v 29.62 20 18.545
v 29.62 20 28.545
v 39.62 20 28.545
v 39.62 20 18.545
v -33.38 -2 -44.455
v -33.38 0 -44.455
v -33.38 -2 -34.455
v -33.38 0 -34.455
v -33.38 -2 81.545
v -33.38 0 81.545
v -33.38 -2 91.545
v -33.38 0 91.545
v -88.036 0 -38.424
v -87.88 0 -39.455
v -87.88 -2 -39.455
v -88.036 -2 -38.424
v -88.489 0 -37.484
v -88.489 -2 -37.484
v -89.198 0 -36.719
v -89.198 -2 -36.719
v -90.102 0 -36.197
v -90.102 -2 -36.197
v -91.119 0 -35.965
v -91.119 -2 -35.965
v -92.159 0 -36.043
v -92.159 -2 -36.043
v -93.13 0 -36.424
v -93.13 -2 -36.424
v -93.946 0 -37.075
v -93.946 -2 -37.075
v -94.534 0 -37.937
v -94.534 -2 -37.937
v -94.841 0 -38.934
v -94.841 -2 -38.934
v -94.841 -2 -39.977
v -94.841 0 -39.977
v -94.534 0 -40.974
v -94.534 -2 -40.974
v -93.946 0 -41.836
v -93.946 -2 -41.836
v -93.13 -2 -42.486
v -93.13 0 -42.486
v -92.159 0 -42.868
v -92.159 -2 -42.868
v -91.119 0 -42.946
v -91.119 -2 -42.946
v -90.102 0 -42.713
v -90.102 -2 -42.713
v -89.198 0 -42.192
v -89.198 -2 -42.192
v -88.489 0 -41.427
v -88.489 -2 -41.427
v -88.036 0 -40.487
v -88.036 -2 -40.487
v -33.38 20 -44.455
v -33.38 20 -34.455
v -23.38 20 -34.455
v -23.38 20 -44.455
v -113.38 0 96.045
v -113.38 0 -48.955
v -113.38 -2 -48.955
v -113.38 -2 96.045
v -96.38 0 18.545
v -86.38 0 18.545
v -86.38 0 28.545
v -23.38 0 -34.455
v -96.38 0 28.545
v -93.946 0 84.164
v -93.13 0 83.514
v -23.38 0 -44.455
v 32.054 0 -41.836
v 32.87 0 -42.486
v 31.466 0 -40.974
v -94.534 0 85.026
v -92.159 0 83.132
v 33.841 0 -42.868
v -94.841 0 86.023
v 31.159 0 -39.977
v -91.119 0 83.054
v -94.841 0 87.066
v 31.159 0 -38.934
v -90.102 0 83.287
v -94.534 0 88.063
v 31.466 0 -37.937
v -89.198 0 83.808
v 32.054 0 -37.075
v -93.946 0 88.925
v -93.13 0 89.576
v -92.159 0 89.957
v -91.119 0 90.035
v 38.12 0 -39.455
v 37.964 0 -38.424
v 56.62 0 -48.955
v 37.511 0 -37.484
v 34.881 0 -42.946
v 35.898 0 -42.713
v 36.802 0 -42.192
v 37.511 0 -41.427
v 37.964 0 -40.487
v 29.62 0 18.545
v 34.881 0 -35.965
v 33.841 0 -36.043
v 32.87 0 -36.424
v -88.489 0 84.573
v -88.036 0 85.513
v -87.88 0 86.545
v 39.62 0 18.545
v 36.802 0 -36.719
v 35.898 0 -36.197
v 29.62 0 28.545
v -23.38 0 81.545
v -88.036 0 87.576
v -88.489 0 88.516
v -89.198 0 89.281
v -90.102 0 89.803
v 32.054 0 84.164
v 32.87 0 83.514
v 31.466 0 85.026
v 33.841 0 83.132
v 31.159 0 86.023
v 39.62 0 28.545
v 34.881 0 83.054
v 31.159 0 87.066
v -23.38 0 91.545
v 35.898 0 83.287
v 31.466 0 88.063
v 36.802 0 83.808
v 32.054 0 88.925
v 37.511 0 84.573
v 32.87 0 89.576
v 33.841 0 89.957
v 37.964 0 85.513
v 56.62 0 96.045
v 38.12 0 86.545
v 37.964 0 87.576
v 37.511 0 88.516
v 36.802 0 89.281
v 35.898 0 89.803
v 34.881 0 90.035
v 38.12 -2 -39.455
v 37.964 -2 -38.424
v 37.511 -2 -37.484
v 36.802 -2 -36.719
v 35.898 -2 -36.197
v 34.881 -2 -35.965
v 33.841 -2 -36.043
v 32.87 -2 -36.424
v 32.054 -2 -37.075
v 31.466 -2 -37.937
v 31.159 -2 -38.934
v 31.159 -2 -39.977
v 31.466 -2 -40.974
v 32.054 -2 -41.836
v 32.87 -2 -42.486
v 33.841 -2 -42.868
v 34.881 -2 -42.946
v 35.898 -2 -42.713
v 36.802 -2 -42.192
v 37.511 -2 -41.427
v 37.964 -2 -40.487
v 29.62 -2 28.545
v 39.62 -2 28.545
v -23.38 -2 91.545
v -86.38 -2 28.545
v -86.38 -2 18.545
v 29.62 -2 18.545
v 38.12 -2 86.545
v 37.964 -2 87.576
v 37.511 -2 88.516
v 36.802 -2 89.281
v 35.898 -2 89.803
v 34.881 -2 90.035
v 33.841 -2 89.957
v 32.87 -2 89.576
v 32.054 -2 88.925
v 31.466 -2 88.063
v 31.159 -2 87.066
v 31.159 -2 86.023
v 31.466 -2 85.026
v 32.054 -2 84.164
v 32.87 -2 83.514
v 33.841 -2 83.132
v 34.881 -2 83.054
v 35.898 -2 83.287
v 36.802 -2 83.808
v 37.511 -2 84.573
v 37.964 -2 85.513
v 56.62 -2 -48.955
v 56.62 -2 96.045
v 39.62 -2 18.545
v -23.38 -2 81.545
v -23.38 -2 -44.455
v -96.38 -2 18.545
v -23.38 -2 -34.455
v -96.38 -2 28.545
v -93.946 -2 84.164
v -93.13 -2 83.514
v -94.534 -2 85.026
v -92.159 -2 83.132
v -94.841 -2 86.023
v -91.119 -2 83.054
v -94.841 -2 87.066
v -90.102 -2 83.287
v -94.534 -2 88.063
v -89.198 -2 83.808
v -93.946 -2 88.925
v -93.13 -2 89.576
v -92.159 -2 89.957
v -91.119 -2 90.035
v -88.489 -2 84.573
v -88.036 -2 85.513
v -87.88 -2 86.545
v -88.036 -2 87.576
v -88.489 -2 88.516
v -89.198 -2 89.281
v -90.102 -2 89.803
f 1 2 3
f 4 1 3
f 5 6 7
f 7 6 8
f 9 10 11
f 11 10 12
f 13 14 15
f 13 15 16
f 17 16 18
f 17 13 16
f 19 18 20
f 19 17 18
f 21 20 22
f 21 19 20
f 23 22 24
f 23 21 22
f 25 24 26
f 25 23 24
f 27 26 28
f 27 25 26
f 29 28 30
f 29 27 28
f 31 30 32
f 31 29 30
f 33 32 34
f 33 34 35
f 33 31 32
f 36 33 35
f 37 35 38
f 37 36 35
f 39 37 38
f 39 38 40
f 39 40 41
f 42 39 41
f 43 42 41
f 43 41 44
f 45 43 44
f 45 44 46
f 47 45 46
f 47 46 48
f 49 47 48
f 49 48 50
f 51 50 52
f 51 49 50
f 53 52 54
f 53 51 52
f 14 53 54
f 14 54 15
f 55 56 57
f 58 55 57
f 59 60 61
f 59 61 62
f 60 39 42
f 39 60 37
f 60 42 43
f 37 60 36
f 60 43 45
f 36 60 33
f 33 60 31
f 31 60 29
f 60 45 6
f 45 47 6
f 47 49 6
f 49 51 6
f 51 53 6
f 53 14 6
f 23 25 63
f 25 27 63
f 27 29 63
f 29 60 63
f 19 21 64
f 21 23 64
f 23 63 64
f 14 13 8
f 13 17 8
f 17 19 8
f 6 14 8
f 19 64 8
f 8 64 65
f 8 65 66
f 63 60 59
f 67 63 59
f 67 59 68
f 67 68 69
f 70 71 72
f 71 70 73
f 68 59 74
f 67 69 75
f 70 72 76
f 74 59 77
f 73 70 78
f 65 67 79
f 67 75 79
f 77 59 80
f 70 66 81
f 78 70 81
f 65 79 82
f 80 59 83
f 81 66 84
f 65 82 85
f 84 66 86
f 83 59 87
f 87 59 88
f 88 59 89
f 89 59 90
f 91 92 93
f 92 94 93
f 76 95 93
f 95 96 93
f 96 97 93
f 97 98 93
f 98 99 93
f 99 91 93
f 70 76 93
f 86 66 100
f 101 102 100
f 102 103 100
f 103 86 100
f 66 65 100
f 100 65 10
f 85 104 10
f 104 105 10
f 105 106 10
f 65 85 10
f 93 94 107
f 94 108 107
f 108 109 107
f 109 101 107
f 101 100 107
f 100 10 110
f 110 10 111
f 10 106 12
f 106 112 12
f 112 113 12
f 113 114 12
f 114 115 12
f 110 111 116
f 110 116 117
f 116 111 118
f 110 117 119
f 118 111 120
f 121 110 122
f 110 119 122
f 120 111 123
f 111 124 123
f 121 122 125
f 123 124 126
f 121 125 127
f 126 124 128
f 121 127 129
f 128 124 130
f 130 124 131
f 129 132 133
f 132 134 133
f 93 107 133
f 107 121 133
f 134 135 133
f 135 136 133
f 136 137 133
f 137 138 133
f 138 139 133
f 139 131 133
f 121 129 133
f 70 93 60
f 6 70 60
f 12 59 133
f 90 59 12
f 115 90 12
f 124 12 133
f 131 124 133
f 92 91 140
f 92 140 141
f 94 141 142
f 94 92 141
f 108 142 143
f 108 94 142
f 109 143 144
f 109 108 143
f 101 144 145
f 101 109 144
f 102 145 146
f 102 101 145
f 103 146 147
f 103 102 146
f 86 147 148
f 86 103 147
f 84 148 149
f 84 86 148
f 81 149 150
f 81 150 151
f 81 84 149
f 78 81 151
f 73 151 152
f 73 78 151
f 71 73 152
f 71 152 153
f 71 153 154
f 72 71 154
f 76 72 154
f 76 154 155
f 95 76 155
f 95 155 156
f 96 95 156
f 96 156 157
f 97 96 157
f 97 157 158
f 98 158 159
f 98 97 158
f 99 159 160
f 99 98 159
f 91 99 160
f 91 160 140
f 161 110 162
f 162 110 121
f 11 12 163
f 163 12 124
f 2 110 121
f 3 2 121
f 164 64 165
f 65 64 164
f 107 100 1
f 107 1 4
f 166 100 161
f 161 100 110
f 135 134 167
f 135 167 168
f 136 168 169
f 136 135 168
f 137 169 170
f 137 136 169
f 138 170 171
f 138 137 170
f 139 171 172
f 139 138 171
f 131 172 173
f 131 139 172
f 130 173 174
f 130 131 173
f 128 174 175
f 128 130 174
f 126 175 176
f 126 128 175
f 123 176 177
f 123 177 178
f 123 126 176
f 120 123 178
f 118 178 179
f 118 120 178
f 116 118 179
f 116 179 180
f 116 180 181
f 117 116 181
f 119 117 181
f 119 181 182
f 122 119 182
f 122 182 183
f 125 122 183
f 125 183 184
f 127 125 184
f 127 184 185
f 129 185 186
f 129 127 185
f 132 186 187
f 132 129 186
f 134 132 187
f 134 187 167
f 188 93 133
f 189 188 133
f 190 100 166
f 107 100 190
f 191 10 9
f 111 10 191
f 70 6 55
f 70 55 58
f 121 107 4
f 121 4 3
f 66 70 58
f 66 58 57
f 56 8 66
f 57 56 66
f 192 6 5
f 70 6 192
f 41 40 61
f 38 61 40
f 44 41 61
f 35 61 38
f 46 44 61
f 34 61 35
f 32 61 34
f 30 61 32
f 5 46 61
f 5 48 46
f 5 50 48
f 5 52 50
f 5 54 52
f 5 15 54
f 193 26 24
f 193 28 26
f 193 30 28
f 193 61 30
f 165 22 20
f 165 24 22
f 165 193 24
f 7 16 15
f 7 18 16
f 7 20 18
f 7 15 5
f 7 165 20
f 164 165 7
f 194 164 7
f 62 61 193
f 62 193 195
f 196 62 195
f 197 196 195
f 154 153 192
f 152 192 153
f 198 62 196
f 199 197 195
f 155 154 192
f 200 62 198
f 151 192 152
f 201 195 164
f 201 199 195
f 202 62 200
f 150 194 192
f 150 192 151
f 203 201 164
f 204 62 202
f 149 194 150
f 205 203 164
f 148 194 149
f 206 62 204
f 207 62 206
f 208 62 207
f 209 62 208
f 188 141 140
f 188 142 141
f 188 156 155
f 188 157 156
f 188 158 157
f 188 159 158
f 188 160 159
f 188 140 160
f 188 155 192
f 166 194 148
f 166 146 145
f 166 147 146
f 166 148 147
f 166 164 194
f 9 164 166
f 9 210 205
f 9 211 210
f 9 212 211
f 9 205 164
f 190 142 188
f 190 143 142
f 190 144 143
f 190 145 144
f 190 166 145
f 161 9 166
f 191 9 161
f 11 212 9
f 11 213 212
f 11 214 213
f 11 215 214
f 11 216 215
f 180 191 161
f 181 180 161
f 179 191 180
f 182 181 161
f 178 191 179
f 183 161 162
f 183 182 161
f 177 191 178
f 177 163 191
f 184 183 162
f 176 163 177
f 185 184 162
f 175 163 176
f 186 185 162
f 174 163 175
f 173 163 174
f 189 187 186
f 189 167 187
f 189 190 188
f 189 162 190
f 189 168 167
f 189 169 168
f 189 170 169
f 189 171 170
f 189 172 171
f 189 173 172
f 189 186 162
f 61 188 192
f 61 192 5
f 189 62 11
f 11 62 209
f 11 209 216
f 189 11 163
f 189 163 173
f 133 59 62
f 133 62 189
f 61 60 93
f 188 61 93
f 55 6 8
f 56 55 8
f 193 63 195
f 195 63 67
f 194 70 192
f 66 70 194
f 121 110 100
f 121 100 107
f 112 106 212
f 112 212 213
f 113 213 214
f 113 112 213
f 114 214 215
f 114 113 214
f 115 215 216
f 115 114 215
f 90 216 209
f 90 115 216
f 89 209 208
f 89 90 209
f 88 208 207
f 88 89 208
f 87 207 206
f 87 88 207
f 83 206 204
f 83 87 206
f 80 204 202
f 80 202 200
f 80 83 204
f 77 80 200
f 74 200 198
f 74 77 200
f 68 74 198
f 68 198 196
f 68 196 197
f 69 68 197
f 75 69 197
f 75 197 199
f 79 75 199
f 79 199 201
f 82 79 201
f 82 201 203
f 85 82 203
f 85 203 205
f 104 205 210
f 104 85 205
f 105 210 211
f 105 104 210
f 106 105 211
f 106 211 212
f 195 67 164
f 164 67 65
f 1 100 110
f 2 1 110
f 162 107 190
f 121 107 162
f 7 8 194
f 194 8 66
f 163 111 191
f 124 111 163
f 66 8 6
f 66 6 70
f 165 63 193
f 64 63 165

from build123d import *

# Parameters (mm, degrees)
F0_W     = 10
F0_H     = 10
F7_DEPTH = 20
F8_DEPTH = 20
F0_W_2   = 170
F0_H_2   = 145
F0_R     = 3.5
F9_DEPTH = 2


# Not quite as in the source:
# - the program builds the solid bodies; features that only make, move or delete a surface that nothing else refers to are left out


with BuildPart() as f7:
    # F0 (on Front) → F7 (new body)
    with BuildSketch(Plane.XZ):
        with Locations((34.6195249557, 23.5447047651)):
            Rectangle(F0_W, F0_H)
    extrude(amount=-F7_DEPTH)


with BuildPart() as f8:
    # F0 (on Front) → F8 (new body)
    with BuildSketch(Plane.XZ):
        with Locations((-28.3804750443, -39.4552952349)):
            Rectangle(F0_W, F0_H)
    extrude(amount=-F8_DEPTH)


with BuildPart() as f9:
    # F0 (on Front) → F9 (new body)
    with BuildSketch(Plane.XZ):
        with Locations((-28.3804750443, 23.5447047651)):
            Rectangle(F0_W_2, F0_H_2)
        with Locations((-91.3804750443, -39.4552952349)):
            Circle(F0_R, mode=Mode.SUBTRACT)
        with Locations((-28.3804750443, -39.4552952349)):
            Rectangle(F0_W, F0_H, mode=Mode.SUBTRACT)
        with Locations((34.6195249557, -39.4552952349)):
            Circle(F0_R, mode=Mode.SUBTRACT)
        with Locations((-91.3804750443, 23.5447047651)):
            Rectangle(F0_W, F0_H, mode=Mode.SUBTRACT)
        with Locations((-91.3804750443, 86.5447047651)):
            Circle(F0_R, mode=Mode.SUBTRACT)
        with Locations((34.6195249557, 23.5447047651)):
            Rectangle(F0_W, F0_H, mode=Mode.SUBTRACT)
        with Locations((-28.3804750443, 86.5447047651)):
            Rectangle(F0_W, F0_H, mode=Mode.SUBTRACT)
        with Locations((34.6195249557, 86.5447047651)):
            Circle(F0_R, mode=Mode.SUBTRACT)
    extrude(amount=F9_DEPTH)


solid = Compound([f7.part, f8.part, f9.part])
